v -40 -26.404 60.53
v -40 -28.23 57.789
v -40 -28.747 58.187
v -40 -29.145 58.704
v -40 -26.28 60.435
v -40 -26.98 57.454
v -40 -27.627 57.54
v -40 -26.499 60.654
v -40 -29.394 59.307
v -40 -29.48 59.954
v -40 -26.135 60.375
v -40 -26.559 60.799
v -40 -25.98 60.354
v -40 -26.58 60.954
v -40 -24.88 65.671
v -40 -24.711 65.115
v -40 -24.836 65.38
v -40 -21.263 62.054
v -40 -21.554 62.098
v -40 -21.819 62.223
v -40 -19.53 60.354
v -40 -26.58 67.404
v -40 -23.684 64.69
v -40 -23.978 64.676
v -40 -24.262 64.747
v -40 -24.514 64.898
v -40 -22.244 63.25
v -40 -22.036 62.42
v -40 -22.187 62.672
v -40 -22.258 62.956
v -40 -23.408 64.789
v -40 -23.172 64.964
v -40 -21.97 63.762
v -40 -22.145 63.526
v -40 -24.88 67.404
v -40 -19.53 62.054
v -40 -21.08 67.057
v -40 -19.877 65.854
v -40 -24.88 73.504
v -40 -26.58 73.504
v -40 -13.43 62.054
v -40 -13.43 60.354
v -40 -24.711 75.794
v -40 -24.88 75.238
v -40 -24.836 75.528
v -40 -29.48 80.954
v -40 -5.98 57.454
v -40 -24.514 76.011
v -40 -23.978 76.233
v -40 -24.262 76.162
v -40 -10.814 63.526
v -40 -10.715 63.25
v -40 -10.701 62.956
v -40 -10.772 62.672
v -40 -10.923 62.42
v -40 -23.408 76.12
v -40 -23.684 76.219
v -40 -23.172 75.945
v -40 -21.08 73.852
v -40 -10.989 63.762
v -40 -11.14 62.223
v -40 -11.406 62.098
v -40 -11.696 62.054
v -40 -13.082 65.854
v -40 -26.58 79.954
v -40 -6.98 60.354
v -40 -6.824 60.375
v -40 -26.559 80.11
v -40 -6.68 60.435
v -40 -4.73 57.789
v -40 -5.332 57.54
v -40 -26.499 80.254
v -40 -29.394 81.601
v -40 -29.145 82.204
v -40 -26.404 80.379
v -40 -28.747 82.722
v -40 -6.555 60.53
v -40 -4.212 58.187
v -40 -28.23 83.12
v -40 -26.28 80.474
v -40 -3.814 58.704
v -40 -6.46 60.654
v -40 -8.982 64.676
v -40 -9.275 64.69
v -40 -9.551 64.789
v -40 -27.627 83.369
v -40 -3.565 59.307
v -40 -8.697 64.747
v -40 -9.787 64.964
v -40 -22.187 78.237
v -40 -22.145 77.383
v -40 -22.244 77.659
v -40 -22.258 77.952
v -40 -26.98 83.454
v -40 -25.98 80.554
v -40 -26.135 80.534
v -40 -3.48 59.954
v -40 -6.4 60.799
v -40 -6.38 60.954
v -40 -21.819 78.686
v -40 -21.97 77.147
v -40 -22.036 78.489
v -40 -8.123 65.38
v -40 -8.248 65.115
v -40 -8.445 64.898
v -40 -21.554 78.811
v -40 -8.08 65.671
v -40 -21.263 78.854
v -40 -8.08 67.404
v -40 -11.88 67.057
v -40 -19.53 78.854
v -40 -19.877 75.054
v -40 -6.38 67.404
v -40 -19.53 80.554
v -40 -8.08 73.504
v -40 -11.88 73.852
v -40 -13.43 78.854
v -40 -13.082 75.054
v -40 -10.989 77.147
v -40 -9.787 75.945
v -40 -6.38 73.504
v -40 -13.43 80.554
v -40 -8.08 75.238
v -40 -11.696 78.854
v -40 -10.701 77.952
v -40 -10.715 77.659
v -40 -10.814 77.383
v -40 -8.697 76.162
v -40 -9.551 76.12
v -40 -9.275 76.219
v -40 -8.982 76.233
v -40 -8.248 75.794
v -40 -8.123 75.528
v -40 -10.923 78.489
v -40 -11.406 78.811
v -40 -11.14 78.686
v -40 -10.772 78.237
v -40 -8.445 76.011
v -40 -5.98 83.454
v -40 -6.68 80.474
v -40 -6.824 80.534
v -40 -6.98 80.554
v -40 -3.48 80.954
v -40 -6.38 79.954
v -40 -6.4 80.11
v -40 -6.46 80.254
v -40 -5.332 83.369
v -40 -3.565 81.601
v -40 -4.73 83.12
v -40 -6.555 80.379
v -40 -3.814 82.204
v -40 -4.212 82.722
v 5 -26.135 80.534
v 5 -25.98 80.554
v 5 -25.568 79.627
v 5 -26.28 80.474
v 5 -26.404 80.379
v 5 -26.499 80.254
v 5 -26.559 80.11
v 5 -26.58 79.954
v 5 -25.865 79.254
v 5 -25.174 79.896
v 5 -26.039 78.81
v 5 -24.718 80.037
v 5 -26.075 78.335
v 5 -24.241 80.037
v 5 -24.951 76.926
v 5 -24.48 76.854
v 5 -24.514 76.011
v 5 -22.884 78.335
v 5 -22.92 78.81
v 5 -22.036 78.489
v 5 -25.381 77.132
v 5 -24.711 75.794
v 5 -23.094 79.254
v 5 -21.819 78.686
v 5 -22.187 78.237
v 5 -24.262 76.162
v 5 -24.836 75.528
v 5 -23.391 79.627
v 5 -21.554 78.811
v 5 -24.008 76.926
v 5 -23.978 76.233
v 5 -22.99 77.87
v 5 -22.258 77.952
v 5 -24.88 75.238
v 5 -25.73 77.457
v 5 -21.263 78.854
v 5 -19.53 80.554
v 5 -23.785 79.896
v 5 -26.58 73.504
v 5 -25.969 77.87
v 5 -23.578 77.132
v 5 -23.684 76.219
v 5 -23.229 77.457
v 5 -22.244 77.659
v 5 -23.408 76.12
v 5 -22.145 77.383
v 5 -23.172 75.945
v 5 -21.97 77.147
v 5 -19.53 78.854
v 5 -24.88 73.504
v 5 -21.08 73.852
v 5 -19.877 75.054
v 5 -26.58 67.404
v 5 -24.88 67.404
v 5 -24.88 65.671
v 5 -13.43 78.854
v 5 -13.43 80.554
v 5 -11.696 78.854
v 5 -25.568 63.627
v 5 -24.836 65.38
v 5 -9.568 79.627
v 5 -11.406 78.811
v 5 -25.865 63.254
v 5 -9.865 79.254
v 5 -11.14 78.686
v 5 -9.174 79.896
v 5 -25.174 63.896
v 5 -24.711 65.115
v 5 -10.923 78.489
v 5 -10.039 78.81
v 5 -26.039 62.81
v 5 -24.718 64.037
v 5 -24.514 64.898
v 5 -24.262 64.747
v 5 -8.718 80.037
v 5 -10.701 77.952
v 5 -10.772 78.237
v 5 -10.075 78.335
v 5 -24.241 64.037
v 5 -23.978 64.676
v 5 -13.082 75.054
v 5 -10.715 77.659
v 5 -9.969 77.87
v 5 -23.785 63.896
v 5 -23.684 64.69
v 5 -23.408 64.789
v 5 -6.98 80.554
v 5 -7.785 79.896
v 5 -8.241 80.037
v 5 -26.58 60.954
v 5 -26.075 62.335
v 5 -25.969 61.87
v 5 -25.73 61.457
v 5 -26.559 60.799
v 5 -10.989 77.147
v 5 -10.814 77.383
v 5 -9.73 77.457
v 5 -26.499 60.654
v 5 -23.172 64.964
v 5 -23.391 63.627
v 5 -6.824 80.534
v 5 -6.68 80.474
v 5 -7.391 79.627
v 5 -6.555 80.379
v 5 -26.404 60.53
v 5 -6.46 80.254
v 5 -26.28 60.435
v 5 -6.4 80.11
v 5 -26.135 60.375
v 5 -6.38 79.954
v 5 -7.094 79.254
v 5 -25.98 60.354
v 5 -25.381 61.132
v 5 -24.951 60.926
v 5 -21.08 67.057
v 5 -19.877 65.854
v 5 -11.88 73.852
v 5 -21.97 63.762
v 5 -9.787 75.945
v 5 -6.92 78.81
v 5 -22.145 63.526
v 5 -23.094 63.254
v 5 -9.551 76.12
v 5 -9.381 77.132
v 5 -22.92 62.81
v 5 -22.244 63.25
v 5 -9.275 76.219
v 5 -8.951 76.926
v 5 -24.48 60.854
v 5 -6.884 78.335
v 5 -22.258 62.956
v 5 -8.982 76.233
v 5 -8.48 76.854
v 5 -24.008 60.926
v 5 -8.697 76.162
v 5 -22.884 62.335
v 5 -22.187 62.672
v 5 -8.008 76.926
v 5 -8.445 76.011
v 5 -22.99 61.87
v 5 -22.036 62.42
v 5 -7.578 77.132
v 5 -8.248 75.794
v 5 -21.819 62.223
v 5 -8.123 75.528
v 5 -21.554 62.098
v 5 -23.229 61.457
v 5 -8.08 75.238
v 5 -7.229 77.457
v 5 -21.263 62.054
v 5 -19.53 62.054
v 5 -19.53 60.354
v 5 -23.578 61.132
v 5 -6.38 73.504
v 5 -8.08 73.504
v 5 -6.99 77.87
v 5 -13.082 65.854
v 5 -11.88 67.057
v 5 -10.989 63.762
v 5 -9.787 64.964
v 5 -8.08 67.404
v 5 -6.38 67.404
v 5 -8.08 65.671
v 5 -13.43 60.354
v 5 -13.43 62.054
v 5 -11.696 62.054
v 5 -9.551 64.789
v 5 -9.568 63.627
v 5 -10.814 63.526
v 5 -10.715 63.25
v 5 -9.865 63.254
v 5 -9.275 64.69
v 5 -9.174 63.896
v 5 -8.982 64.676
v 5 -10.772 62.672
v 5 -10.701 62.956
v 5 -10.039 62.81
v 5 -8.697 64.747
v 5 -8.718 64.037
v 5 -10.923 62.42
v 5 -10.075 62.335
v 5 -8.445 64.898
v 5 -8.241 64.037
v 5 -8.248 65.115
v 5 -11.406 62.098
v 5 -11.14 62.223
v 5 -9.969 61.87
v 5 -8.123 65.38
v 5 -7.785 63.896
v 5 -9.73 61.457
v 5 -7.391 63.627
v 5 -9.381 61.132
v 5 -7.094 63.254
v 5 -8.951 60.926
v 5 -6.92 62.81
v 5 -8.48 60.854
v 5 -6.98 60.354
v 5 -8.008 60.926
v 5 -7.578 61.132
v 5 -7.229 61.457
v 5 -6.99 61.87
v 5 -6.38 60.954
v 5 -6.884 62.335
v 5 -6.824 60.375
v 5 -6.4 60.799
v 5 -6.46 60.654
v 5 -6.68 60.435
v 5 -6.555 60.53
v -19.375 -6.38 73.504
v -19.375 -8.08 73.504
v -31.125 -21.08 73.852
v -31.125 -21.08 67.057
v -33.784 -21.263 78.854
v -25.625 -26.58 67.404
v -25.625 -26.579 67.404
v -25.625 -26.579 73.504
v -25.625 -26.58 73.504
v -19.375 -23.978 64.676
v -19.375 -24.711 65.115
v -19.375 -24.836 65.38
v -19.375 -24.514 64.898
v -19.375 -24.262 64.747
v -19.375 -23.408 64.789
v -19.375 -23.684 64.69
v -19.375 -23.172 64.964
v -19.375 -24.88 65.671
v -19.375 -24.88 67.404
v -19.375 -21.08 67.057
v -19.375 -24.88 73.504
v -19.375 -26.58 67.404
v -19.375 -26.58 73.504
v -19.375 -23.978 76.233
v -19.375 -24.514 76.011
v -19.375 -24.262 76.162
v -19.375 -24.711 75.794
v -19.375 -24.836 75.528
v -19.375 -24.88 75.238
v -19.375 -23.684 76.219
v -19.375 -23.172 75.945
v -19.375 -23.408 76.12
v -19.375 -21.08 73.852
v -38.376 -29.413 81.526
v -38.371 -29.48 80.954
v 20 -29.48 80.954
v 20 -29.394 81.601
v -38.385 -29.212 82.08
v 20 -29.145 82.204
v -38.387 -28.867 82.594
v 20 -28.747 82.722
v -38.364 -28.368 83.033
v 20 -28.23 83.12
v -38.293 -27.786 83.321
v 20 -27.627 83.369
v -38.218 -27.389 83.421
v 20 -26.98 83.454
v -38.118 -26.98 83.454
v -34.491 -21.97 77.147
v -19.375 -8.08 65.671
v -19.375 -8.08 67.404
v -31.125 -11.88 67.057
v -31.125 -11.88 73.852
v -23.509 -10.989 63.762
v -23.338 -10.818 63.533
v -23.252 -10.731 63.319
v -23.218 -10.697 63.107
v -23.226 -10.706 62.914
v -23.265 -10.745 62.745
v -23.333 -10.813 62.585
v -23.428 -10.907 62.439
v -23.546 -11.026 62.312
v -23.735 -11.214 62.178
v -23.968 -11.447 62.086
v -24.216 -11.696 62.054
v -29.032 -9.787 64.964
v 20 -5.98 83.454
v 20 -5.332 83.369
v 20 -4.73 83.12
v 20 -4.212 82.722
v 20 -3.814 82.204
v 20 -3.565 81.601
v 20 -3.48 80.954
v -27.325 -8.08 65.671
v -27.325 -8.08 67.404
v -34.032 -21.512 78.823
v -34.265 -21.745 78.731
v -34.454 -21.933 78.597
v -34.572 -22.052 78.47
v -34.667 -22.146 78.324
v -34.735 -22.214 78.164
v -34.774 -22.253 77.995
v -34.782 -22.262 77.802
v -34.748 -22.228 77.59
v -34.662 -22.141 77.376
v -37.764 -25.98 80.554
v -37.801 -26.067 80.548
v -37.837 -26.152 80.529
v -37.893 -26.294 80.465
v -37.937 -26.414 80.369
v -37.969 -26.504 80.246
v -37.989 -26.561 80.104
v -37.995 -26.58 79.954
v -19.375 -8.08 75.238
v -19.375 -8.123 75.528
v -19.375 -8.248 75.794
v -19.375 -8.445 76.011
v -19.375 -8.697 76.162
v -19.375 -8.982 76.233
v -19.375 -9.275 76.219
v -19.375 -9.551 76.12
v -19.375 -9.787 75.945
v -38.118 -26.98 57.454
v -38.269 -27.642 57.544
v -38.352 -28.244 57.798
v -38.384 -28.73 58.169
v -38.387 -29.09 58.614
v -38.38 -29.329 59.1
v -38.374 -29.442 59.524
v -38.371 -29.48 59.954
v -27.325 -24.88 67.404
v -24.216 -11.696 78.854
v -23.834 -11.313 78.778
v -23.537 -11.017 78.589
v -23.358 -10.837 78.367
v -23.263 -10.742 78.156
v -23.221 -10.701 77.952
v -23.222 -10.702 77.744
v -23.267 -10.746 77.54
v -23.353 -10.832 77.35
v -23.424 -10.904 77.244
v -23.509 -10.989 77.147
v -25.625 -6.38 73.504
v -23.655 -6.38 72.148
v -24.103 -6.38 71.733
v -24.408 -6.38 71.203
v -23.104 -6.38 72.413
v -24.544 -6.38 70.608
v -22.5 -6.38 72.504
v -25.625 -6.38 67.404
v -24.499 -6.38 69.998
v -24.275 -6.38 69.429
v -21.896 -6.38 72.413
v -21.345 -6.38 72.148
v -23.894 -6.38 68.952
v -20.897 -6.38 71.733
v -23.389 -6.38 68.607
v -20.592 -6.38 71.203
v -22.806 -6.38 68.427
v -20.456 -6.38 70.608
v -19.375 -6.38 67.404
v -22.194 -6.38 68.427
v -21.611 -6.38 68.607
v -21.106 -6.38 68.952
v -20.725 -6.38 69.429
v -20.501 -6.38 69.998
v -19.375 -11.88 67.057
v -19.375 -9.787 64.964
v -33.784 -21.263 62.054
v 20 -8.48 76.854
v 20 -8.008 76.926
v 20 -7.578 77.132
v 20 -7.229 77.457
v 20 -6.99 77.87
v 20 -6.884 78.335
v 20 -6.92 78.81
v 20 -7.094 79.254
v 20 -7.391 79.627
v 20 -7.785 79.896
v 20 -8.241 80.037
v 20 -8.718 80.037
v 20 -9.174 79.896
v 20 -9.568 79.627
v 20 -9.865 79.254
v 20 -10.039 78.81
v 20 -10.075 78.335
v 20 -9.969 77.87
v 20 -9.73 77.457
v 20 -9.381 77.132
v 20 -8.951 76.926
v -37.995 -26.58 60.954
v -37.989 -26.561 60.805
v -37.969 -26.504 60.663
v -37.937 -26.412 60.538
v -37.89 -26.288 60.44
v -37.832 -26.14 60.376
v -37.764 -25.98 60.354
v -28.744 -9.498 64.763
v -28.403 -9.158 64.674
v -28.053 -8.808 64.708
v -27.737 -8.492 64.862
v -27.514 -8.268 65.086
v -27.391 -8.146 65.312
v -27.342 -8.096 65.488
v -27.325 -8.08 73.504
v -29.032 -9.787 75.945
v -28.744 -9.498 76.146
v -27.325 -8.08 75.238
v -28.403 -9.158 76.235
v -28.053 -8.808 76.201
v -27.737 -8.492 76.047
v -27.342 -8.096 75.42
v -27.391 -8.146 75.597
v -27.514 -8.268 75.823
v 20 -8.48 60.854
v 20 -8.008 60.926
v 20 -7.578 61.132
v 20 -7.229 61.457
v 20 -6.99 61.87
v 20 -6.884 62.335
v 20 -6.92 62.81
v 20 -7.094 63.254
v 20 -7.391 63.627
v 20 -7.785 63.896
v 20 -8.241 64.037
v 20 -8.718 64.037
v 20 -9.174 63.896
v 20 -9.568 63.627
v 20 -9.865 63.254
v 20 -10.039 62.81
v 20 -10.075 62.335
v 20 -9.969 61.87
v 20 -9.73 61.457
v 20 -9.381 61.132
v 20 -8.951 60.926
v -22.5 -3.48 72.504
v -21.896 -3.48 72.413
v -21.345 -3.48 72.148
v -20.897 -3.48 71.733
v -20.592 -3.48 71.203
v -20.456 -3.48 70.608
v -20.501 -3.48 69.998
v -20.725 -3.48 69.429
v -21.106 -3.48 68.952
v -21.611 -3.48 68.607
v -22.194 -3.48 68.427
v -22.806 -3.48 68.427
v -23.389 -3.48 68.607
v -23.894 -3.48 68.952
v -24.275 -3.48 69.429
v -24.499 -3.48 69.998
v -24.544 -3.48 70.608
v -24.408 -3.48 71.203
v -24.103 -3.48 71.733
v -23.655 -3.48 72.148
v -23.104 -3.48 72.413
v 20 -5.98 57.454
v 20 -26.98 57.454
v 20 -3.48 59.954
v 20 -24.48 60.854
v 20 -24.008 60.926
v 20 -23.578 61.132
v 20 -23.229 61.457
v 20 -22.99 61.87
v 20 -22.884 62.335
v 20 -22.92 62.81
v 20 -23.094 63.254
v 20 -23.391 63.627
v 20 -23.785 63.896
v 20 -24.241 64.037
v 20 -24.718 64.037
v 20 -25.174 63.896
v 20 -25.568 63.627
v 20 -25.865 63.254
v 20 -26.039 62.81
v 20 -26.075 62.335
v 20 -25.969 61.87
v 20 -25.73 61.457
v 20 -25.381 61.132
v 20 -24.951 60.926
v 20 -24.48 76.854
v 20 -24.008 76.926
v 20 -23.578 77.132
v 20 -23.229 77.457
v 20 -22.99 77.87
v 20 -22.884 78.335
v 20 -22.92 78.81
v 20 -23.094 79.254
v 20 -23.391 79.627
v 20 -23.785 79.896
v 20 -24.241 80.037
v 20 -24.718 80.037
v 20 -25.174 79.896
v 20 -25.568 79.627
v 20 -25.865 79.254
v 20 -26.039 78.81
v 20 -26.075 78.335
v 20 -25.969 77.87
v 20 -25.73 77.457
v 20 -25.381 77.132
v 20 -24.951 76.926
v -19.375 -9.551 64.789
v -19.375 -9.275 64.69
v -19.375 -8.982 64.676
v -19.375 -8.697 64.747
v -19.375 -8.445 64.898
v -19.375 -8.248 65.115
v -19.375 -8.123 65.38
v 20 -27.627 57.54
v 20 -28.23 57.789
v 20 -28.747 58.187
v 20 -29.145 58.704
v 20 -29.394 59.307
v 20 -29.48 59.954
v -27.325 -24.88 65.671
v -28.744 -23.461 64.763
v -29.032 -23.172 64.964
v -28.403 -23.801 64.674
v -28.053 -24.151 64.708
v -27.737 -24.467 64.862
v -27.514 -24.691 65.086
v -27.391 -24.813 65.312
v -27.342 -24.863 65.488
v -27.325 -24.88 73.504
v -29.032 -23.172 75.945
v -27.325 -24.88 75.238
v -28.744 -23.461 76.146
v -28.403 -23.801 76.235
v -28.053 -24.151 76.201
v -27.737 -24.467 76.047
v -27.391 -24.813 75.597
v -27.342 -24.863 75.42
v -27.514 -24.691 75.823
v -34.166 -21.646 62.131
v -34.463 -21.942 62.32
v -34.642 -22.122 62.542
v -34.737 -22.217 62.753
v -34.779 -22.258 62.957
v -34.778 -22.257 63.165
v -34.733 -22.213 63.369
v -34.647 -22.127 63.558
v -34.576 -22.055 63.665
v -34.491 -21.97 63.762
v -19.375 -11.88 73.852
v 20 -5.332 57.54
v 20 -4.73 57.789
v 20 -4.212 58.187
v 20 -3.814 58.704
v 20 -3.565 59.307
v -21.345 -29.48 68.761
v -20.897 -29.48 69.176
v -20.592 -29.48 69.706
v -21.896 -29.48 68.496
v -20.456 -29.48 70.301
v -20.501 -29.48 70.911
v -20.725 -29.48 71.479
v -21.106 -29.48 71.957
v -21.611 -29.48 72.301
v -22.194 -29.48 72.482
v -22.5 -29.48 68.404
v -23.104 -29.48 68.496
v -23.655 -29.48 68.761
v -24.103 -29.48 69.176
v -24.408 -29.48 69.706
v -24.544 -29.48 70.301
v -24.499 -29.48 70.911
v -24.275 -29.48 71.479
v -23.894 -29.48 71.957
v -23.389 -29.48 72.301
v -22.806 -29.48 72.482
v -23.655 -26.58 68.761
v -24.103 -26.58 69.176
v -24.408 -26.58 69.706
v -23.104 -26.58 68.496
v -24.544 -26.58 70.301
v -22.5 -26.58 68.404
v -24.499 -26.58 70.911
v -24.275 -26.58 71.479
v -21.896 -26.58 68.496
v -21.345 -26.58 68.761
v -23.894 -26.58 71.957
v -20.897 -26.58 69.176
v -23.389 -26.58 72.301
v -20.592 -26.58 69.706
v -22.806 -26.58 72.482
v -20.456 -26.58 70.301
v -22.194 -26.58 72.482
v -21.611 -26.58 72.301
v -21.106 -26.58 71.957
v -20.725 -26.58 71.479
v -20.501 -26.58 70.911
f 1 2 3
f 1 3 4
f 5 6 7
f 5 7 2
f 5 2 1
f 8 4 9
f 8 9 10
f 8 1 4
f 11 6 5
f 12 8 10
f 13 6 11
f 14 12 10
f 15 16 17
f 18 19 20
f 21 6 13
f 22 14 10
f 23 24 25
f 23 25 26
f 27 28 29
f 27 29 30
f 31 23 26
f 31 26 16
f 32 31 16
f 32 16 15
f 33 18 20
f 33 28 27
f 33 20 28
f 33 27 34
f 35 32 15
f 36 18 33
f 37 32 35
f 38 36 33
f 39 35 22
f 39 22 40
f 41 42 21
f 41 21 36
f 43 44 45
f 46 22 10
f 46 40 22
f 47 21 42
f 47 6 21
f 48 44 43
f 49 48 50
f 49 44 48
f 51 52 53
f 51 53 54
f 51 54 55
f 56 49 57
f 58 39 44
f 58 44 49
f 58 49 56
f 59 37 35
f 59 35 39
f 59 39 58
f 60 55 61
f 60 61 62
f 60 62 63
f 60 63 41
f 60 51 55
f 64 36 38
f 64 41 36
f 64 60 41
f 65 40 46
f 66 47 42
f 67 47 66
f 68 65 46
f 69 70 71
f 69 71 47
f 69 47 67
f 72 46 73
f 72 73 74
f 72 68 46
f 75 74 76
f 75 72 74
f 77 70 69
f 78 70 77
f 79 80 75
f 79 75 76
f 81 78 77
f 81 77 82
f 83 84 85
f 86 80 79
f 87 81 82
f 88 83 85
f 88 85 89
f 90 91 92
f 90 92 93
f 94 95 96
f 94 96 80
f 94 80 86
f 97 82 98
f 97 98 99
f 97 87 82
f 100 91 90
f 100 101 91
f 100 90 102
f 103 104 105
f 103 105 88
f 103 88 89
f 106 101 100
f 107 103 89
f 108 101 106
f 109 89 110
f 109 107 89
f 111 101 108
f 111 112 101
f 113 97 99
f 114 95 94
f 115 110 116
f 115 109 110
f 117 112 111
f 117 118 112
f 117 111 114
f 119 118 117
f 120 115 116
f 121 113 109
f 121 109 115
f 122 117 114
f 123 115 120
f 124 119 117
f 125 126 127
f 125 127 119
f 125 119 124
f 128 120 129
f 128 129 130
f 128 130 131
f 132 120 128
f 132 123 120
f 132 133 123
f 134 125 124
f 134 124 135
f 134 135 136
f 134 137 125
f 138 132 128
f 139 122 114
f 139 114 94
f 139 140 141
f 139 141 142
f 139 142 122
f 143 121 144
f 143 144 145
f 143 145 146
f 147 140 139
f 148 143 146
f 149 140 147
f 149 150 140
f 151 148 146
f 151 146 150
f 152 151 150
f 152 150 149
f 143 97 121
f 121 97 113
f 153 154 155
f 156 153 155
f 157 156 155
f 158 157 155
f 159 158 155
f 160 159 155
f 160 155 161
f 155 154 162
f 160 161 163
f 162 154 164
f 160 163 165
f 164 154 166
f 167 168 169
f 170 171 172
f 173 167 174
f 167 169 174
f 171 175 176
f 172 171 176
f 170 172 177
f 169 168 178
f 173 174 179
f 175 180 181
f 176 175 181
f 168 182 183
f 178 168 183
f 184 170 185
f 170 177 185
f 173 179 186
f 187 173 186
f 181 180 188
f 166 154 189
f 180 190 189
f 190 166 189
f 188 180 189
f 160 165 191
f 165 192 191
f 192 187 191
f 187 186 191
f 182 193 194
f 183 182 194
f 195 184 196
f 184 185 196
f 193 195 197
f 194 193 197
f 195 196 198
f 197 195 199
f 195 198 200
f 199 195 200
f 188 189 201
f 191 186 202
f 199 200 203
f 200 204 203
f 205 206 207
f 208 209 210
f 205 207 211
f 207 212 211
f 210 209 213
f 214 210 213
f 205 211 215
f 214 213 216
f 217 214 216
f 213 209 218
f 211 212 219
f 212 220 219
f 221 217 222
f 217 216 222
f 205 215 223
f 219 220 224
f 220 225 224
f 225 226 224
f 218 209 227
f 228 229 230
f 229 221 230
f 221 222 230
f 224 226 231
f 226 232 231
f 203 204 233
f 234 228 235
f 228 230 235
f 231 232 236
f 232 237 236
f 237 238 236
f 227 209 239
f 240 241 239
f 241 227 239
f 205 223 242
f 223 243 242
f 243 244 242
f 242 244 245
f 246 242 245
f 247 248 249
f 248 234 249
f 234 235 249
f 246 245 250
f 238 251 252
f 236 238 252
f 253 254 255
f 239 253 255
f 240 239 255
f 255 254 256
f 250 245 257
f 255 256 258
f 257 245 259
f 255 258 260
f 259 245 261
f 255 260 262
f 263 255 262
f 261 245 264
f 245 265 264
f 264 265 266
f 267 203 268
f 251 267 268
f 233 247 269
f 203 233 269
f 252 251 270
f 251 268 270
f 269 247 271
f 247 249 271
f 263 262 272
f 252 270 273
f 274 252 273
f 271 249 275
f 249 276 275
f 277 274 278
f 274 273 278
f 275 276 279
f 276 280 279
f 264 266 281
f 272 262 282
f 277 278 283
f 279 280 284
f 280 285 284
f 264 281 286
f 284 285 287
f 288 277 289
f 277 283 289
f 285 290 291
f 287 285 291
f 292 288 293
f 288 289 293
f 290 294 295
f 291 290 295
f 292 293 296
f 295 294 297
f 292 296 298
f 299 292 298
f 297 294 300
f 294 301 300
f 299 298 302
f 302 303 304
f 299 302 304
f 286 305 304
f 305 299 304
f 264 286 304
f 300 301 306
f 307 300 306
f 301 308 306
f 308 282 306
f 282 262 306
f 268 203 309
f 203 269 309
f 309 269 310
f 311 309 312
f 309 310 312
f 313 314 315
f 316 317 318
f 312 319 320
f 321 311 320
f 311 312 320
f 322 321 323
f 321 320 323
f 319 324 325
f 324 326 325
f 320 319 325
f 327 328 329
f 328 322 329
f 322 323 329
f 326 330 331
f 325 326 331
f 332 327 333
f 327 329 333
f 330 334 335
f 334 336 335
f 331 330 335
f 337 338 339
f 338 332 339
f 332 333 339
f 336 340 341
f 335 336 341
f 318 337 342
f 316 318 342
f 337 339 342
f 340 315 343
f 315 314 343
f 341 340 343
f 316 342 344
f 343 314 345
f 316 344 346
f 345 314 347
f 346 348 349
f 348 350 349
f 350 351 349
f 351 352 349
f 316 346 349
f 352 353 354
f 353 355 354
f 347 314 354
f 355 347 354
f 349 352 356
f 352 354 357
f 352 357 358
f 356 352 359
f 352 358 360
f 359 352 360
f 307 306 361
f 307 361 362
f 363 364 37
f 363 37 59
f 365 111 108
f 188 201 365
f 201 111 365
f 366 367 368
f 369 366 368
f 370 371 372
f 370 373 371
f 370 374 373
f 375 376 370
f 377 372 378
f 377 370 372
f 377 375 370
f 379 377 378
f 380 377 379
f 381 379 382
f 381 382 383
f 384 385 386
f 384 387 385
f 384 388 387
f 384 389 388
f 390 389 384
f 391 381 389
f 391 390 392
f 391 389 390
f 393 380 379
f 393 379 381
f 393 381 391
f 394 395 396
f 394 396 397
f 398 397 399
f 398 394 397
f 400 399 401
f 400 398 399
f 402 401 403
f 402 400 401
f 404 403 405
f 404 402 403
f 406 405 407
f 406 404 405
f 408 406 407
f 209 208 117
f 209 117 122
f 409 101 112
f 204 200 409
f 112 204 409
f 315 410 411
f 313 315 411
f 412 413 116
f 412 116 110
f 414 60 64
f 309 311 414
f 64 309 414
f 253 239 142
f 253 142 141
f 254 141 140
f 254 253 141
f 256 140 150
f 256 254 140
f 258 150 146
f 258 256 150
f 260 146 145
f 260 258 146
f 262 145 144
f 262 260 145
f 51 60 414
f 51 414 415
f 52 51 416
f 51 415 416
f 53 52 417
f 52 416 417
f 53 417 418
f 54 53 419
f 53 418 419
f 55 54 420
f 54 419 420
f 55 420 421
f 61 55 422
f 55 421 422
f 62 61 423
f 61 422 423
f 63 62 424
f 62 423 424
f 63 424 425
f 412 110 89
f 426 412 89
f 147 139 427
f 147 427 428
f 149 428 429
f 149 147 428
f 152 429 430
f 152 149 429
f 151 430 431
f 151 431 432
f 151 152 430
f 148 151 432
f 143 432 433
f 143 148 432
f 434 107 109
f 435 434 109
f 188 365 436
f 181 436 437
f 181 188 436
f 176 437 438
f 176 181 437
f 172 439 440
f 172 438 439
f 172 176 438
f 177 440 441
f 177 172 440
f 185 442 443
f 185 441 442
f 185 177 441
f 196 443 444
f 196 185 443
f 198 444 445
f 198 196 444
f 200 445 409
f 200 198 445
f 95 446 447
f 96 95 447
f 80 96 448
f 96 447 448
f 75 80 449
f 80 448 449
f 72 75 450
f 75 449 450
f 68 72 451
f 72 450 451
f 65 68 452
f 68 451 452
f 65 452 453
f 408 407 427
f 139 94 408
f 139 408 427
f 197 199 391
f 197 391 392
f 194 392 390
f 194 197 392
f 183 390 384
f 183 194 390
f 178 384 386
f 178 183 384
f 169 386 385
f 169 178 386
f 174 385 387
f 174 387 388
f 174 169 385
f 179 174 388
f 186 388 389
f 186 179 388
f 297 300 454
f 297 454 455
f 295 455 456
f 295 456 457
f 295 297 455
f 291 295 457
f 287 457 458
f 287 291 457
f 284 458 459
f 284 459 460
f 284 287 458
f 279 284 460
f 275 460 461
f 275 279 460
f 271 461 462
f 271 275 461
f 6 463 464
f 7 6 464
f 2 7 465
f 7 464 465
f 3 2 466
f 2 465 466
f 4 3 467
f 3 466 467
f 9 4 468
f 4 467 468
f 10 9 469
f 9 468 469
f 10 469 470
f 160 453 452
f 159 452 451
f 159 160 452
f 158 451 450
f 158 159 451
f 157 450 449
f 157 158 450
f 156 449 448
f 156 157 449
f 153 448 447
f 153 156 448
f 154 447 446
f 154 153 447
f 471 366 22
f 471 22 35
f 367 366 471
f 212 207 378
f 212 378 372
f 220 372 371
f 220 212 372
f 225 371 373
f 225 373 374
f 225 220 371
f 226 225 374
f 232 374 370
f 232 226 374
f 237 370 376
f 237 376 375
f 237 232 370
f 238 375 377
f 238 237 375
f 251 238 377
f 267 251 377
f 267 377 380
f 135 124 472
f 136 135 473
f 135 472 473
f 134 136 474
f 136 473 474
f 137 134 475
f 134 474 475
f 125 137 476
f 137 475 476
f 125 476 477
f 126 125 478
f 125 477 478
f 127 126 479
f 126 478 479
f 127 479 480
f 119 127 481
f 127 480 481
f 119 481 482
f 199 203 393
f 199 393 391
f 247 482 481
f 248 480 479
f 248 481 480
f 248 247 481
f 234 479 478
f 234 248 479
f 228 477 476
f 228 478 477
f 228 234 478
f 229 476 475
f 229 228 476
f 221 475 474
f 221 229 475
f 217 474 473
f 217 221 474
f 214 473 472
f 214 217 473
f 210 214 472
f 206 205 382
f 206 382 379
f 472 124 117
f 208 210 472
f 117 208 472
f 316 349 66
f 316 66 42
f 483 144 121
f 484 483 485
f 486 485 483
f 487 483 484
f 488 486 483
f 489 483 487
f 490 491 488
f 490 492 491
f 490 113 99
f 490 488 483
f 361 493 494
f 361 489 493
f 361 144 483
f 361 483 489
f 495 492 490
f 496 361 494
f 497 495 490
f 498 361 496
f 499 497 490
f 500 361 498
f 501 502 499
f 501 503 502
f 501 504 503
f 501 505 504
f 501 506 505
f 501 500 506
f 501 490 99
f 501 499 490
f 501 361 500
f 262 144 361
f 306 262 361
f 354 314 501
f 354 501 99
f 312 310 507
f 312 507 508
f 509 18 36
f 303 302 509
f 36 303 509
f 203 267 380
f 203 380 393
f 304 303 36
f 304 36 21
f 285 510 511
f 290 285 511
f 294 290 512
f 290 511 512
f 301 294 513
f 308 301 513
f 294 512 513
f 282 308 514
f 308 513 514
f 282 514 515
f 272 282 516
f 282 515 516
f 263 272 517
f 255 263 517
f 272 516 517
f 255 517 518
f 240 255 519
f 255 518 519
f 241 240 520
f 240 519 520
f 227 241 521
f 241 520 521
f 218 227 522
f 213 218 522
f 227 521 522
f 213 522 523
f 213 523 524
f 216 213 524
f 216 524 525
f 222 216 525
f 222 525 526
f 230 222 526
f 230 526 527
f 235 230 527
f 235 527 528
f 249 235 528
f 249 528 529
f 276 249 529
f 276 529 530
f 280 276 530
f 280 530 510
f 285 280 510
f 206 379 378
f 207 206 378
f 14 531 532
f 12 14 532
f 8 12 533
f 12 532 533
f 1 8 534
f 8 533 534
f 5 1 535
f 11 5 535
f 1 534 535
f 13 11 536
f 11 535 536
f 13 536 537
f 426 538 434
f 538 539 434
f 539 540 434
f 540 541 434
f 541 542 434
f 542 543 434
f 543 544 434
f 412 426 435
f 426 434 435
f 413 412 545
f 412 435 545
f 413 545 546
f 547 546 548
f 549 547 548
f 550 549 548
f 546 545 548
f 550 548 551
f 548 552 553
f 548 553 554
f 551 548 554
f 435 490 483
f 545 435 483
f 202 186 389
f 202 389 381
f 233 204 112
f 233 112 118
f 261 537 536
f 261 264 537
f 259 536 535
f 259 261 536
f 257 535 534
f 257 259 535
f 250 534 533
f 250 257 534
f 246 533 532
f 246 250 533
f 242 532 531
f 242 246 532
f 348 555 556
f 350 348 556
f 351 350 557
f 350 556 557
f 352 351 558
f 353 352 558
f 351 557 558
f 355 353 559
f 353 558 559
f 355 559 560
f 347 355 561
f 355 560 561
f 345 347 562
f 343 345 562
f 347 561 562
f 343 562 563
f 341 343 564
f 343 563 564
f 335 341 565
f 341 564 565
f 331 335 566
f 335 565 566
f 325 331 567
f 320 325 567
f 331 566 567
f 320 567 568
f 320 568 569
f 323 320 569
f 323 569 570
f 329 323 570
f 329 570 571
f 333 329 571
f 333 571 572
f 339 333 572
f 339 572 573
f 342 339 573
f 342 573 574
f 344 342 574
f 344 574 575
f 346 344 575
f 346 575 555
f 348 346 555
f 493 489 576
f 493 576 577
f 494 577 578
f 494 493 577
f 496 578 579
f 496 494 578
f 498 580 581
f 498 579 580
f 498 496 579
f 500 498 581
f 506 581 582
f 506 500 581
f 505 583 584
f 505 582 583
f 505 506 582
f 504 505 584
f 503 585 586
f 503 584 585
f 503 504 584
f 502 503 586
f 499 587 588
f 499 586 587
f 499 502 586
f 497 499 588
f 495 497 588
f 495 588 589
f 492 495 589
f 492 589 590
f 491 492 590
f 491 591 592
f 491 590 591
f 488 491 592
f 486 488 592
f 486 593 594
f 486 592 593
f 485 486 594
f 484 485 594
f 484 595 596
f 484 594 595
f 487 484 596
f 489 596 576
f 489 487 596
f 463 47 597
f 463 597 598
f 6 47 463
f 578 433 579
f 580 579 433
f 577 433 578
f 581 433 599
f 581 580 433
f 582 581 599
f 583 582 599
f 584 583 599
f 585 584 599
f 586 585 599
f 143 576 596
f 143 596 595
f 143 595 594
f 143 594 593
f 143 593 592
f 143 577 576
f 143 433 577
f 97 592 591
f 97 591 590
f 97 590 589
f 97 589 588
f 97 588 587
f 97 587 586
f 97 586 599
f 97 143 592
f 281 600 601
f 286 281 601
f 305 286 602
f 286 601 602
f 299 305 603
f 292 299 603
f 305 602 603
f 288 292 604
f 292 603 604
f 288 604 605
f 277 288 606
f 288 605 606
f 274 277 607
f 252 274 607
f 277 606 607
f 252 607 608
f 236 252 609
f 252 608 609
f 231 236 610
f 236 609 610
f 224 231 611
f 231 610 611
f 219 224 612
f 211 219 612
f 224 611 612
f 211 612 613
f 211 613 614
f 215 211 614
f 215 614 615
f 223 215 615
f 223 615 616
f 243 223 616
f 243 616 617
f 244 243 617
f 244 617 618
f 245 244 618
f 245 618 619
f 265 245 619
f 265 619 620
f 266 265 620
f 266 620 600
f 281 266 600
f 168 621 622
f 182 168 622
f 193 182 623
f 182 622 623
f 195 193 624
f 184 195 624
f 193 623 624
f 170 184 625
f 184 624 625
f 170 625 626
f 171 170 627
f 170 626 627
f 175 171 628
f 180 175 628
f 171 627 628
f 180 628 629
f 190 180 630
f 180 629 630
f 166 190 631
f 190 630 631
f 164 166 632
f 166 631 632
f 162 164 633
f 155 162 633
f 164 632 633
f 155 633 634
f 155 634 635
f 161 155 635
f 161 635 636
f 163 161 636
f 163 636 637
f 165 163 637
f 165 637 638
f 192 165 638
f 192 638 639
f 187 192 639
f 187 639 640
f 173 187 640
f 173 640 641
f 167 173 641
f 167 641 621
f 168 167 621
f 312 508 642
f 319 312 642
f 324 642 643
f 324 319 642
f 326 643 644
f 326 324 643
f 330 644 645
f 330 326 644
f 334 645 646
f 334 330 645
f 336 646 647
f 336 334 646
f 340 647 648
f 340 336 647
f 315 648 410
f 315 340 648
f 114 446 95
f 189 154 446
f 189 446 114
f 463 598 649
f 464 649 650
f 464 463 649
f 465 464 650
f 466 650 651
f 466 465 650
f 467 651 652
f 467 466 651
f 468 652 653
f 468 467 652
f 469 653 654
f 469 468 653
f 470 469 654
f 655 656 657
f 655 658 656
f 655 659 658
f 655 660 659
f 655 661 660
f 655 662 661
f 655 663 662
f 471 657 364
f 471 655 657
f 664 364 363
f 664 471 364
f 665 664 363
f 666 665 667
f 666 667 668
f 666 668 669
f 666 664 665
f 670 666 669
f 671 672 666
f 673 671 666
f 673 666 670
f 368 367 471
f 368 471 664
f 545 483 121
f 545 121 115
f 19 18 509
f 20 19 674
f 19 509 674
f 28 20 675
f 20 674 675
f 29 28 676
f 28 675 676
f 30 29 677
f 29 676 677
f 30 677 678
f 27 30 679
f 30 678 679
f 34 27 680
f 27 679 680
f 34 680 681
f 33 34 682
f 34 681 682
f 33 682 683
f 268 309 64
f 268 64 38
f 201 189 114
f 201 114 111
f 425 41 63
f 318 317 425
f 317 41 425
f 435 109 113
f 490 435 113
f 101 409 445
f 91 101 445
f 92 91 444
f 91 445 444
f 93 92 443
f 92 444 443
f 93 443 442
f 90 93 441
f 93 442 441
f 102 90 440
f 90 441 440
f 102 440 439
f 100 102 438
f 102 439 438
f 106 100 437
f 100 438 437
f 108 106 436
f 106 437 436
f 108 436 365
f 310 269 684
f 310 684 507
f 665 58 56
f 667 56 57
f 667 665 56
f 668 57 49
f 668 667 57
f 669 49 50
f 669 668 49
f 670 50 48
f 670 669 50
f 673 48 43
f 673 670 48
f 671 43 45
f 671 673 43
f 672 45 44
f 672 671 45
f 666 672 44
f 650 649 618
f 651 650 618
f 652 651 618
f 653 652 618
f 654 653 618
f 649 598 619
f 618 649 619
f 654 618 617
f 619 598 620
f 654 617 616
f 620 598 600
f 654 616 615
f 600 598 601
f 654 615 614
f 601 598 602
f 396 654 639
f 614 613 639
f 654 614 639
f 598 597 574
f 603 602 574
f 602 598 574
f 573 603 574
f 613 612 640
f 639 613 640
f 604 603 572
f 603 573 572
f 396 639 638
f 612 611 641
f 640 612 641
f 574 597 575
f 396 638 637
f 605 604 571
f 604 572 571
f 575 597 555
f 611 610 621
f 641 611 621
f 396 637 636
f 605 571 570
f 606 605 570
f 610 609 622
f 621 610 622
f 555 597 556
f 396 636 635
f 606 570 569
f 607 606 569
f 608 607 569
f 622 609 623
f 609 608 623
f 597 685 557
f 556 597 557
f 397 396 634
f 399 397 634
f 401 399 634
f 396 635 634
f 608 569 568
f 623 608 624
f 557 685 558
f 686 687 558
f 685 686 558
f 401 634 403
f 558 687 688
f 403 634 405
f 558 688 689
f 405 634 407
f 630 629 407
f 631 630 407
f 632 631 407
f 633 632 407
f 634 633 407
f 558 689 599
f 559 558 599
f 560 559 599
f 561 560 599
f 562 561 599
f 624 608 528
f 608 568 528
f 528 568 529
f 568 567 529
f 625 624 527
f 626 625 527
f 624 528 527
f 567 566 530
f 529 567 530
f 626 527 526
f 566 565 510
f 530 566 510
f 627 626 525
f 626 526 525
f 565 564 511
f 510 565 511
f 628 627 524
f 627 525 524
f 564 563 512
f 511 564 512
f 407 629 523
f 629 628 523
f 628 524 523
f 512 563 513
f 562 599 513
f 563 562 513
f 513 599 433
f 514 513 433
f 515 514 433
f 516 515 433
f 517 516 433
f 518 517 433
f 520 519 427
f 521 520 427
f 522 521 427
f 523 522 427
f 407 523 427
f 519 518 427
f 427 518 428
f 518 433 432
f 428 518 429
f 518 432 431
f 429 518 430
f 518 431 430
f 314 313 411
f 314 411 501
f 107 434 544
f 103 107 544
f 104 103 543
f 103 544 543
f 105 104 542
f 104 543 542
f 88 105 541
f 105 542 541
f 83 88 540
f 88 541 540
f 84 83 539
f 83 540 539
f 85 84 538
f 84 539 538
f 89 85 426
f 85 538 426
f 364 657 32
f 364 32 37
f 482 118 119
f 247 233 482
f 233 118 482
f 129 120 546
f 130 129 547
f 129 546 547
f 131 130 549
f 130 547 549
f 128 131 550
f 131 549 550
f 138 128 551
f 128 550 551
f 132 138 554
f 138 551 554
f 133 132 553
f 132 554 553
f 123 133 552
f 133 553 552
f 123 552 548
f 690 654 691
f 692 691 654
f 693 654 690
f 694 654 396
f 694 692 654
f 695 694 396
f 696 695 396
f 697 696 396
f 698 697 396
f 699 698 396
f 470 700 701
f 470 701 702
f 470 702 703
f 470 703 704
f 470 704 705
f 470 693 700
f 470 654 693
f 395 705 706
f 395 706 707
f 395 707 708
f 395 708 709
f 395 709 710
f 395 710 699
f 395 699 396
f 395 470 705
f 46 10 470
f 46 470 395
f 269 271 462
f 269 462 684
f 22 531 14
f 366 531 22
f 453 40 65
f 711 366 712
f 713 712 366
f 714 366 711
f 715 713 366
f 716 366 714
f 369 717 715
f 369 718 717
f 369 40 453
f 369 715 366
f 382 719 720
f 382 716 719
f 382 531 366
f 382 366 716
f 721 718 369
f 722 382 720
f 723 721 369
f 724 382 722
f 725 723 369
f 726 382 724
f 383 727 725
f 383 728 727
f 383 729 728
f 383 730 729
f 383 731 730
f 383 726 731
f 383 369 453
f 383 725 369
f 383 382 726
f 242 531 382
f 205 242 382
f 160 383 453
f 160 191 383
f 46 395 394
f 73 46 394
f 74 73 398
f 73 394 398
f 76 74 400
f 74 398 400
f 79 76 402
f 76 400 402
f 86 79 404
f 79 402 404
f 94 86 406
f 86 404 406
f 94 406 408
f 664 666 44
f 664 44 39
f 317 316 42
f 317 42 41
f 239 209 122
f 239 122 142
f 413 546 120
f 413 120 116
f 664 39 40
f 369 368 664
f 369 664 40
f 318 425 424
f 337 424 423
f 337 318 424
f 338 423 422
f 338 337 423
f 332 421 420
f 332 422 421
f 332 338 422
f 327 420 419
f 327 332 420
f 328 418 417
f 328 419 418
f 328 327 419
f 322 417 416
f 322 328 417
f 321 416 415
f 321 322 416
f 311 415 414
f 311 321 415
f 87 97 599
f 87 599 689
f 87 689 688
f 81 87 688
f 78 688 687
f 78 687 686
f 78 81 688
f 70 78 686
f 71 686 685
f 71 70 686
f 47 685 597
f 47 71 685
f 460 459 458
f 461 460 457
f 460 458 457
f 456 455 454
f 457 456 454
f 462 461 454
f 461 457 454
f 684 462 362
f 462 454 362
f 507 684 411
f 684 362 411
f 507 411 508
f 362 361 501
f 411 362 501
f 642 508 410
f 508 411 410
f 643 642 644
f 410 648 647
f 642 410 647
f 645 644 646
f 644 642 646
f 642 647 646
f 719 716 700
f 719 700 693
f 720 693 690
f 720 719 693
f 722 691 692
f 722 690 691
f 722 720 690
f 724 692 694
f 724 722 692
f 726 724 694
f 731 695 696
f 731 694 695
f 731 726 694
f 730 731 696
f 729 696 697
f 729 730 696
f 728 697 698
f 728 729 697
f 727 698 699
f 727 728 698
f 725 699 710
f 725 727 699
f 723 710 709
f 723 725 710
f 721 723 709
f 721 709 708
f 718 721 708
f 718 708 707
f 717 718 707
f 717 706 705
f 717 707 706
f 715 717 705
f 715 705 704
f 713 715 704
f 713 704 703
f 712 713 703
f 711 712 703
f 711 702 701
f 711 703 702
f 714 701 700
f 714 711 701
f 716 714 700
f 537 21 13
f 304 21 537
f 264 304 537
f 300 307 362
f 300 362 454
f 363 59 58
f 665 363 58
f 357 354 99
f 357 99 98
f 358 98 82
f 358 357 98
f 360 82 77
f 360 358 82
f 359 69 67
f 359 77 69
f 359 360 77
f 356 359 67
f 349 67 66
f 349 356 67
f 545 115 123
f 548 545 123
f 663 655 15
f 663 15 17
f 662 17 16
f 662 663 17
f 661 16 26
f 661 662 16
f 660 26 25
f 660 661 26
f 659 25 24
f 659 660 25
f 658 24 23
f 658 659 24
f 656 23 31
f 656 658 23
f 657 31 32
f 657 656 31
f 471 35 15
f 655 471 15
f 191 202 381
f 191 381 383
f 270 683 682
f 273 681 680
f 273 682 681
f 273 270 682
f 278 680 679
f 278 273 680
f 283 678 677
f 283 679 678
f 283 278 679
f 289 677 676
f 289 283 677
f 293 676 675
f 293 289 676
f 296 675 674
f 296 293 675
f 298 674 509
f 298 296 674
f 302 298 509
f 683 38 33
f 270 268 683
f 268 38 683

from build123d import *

# Parameters (mm, degrees)
BOSS_EXTRUDE1_DEPTH      = 39
BOSS_EXTRUDE1_DEPTH_BACK = 20
SKETCH1_W                = 42
SKETCH1_H                = 40
CUT_EXTRUDE3_DEPTH       = 68.939361812
CUT_EXTRUDE3_DEPTH_BACK  = 68.939361812
BOSS_EXTRUDE2_DEPTH      = 40
CUT_EXTRUDE7_START       = -10
SKETCH7_R                = 2.05
CUT_EXTRUDE7_DEPTH       = 116.132850877
CUT_EXTRUDE8_DEPTH       = 3.125
SKETCH9_R                = 2.778089848
BOSS_EXTRUDE3_DEPTH      = 6
CIRPATTERN1_COUNT        = 2
SKETCH10_W               = 6.985924482
SKETCH10_H               = 7.120269183
CUT_EXTRUDE13_DEPTH      = 8
SKETCH14_OUTSIDE_W       = 60.69
SKETCH14_OUTSIDE_H       = 58.69
CUT_EXTRUDE14_DEPTH      = 116.302529068
CHAMFER1_SIZE            = 5.5
SKETCH17_W               = 21.827069389
SKETCH17_H               = 22.909403407
BOSS_EXTRUDE4_DEPTH      = 15
SKETCH18_R               = 1.6
CUT_EXTRUDE15_DEPTH      = 107.928426814


with BuildPart() as part:
    # Sketch1 → Boss-Extrude1 (new, two sides: drawn at the far end of the back side and taken through both)
    with BuildSketch(Plane.ZY.offset(-BOSS_EXTRUDE1_DEPTH_BACK)):
        with Locations((70.454449321, -16.479540615)):
            Rectangle(SKETCH1_W, SKETCH1_H)
        with BuildLine():
            Line((77.147342539, -21.970352305), (75.054449321, -19.877459087))
            Line((75.054449321, -19.877459087), (75.054449321, -13.081622143))
            Line((75.054449321, -13.081622143), (77.147342539, -10.988728924))
            ThreePointArc((77.147342539, -10.988728924), (78.237132753, -10.771956173), (78.854449321, -11.695835705))
            Line((78.854449321, -11.695835705), (78.854449321, -13.429540615))
            Line((78.854449321, -13.429540615), (80.554449321, -13.429540615))
            Line((80.554449321, -13.429540615), (80.554449321, -6.979540615))
            ThreePointArc((80.554449321, -6.979540615), (80.378713389, -6.555276546), (79.954449321, -6.379540615))
            Line((79.954449321, -6.379540615), (73.504449321, -6.379540615))
            Line((73.504449321, -6.379540615), (73.504449321, -8.079540615))
            Line((73.504449321, -8.079540615), (75.23815423, -8.079540615))
            ThreePointArc((75.23815423, -8.079540615), (76.162033763, -8.696857182), (75.945261011, -9.786647396))
            Line((75.945261011, -9.786647396), (73.852367793, -11.879540615))
            Line((73.852367793, -11.879540615), (67.056530849, -11.879540615))
            Line((67.056530849, -11.879540615), (64.96363763, -9.786647396))
            ThreePointArc((64.96363763, -9.786647396), (64.746864878, -8.696857182), (65.670744411, -8.079540615))
            Line((65.670744411, -8.079540615), (67.404449321, -8.079540615))
            Line((67.404449321, -8.079540615), (67.404449321, -6.379540615))
            Line((67.404449321, -6.379540615), (60.954449321, -6.379540615))
            ThreePointArc((60.954449321, -6.379540615), (60.530185252, -6.555276546), (60.354449321, -6.979540615))
            Line((60.354449321, -6.979540615), (60.354449321, -13.429540615))
            Line((60.354449321, -13.429540615), (62.054449321, -13.429540615))
            Line((62.054449321, -13.429540615), (62.054449321, -11.695835705))
            ThreePointArc((62.054449321, -11.695835705), (62.671765888, -10.771956173), (63.761556102, -10.988728924))
            Line((63.761556102, -10.988728924), (65.854449321, -13.081622143))
            Line((65.854449321, -13.081622143), (65.854449321, -19.877459087))
            Line((65.854449321, -19.877459087), (63.761556102, -21.970352305))
            ThreePointArc((63.761556102, -21.970352305), (62.671765888, -22.187125057), (62.054449321, -21.263245524))
            Line((62.054449321, -21.263245524), (62.054449321, -19.529540615))
            Line((62.054449321, -19.529540615), (60.354449321, -19.529540615))
            Line((60.354449321, -19.529540615), (60.354449321, -25.979540615))
            ThreePointArc((60.354449321, -25.979540615), (60.530185252, -26.403804683), (60.954449321, -26.579540615))
            Line((60.954449321, -26.579540615), (67.404449321, -26.579540615))
            Line((67.404449321, -26.579540615), (67.404449321, -24.879540615))
            Line((67.404449321, -24.879540615), (65.670744411, -24.879540615))
            ThreePointArc((65.670744411, -24.879540615), (64.746864878, -24.262224047), (64.96363763, -23.172433833))
            Line((64.96363763, -23.172433833), (67.056530849, -21.079540615))
            Line((67.056530849, -21.079540615), (73.852367793, -21.079540615))
            Line((73.852367793, -21.079540615), (75.945261011, -23.172433833))
            ThreePointArc((75.945261011, -23.172433833), (76.162033763, -24.262224047), (75.23815423, -24.879540615))
            Line((75.23815423, -24.879540615), (73.504449321, -24.879540615))
            Line((73.504449321, -24.879540615), (73.504449321, -26.579540615))
            Line((73.504449321, -26.579540615), (79.954449321, -26.579540615))
            ThreePointArc((79.954449321, -26.579540615), (80.378713389, -26.403804683), (80.554449321, -25.979540615))
            Line((80.554449321, -25.979540615), (80.554449321, -19.529540615))
            Line((80.554449321, -19.529540615), (78.854449321, -19.529540615))
            Line((78.854449321, -19.529540615), (78.854449321, -21.263245524))
            ThreePointArc((78.854449321, -21.263245524), (78.237132753, -22.187125057), (77.147342539, -21.970352305))
        make_face(mode=Mode.SUBTRACT)
    extrude(amount=BOSS_EXTRUDE1_DEPTH + BOSS_EXTRUDE1_DEPTH_BACK)

    # Sketch2 → Cut-Extrude3 (cut, two sides: drawn at the far end of the back side and taken through both)
    with BuildSketch(Plane(origin=(0, 0, 91.454449321), x_dir=(-1, 0, 0), z_dir=(0, 0, -1)).offset(-CUT_EXTRUDE3_DEPTH_BACK)):
        with BuildLine():
            Line((9, 3.520459385), (39, 3.520459385))
            Line((39, 3.520459385), (39, -36.479540615))
            Line((39, -36.479540615), (30.968670474, -36.479540615))
            ThreePointArc((30.968670474, -36.479540615), (30.884335237, -36.480014542), (30.8, -36.479540615))
            Line((30.8, -36.479540615), (30.8, -37.552822487))
            Line((30.8, -37.552822487), (41.446354872, -37.552822487))
            Line((41.446354872, -37.552822487), (41.446354872, 6.899861608))
            Line((41.446354872, 6.899861608), (9, 6.899861608))
            Line((9, 6.899861608), (9, 3.520459385))
        make_face()
        with BuildLine():
            Line((39, -36.479540615), (39, 3.520459385))
            Line((39, 3.520459385), (9, 3.520459385))
            Line((9, 3.520459385), (36.19042941, -23.669970025))
            ThreePointArc((36.19042941, -23.669970025), (37.833109012, -31.808697916), (30.968670474, -36.479540615))
            Line((30.968670474, -36.479540615), (39, -36.479540615))
        make_face()
    extrude(amount=CUT_EXTRUDE3_DEPTH + CUT_EXTRUDE3_DEPTH_BACK, mode=Mode.SUBTRACT)

    # Sketch4 → Boss-Extrude2 (add)
    with BuildSketch(Plane(origin=(0, 0, 0), x_dir=(0, 0, -1), z_dir=(1, 0, 0))):
        with BuildLine():
            Line((-80.954449321, -3.479540615), (-59.954449321, -3.479540615))
            ThreePointArc((-59.954449321, -3.479540615), (-58.186682368, -4.211773662), (-57.454449321, -5.979540615))
            Line((-57.454449321, -5.979540615), (-57.454449321, -26.979540615))
            ThreePointArc((-57.454449321, -26.979540615), (-58.186682368, -28.747307568), (-59.954449321, -29.479540615))
            Line((-59.954449321, -29.479540615), (-80.954449321, -29.479540615))
            ThreePointArc((-80.954449321, -29.479540615), (-82.722216274, -28.747307568), (-83.454449321, -26.979540615))
            Line((-83.454449321, -26.979540615), (-83.454449321, -5.979540615))
            ThreePointArc((-83.454449321, -5.979540615), (-82.722216274, -4.211773662), (-80.954449321, -3.479540615))
        make_face()
        with BuildLine():
            Line((-62.054449321, -11.695835705), (-62.054449321, -13.429540615))
            Line((-62.054449321, -13.429540615), (-60.354449321, -13.429540615))
            Line((-60.354449321, -13.429540615), (-60.354449321, -6.979540615))
            ThreePointArc((-60.354449321, -6.979540615), (-60.530185252, -6.555276546), (-60.954449321, -6.379540615))
            Line((-60.954449321, -6.379540615), (-67.404449321, -6.379540615))
            Line((-67.404449321, -6.379540615), (-67.404449321, -8.079540615))
            Line((-67.404449321, -8.079540615), (-65.670744411, -8.079540615))
            ThreePointArc((-65.670744411, -8.079540615), (-64.746864878, -8.696857182), (-64.96363763, -9.786647396))
            Line((-64.96363763, -9.786647396), (-67.056530849, -11.879540615))
            Line((-67.056530849, -11.879540615), (-73.852367793, -11.879540615))
            Line((-73.852367793, -11.879540615), (-75.945261011, -9.786647396))
            ThreePointArc((-75.945261011, -9.786647396), (-76.162033763, -8.696857182), (-75.23815423, -8.079540615))
            Line((-75.23815423, -8.079540615), (-73.504449321, -8.079540615))
            Line((-73.504449321, -8.079540615), (-73.504449321, -6.379540615))
            Line((-73.504449321, -6.379540615), (-79.954449321, -6.379540615))
            ThreePointArc((-79.954449321, -6.379540615), (-80.378713389, -6.555276546), (-80.554449321, -6.979540615))
            Line((-80.554449321, -6.979540615), (-80.554449321, -13.429540615))
            Line((-80.554449321, -13.429540615), (-78.854449321, -13.429540615))
            Line((-78.854449321, -13.429540615), (-78.854449321, -11.695835705))
            ThreePointArc((-78.854449321, -11.695835705), (-78.237132753, -10.771956173), (-77.147342539, -10.988728924))
            Line((-77.147342539, -10.988728924), (-75.054449321, -13.081622143))
            Line((-75.054449321, -13.081622143), (-75.054449321, -19.877459087))
            Line((-75.054449321, -19.877459087), (-77.147342539, -21.970352305))
            ThreePointArc((-77.147342539, -21.970352305), (-78.237132753, -22.187125057), (-78.854449321, -21.263245524))
            Line((-78.854449321, -21.263245524), (-78.854449321, -19.529540615))
            Line((-78.854449321, -19.529540615), (-80.554449321, -19.529540615))
            Line((-80.554449321, -19.529540615), (-80.554449321, -25.979540615))
            ThreePointArc((-80.554449321, -25.979540615), (-80.378713389, -26.403804683), (-79.954449321, -26.579540615))
            Line((-79.954449321, -26.579540615), (-73.504449321, -26.579540615))
            Line((-73.504449321, -26.579540615), (-73.504449321, -24.879540615))
            Line((-73.504449321, -24.879540615), (-75.23815423, -24.879540615))
            ThreePointArc((-75.23815423, -24.879540615), (-76.162033763, -24.262224047), (-75.945261011, -23.172433833))
            Line((-75.945261011, -23.172433833), (-73.852367793, -21.079540615))
            Line((-73.852367793, -21.079540615), (-67.056530849, -21.079540615))
            Line((-67.056530849, -21.079540615), (-64.96363763, -23.172433833))
            ThreePointArc((-64.96363763, -23.172433833), (-64.746864878, -24.262224047), (-65.670744411, -24.879540615))
            Line((-65.670744411, -24.879540615), (-67.404449321, -24.879540615))
            Line((-67.404449321, -24.879540615), (-67.404449321, -26.579540615))
            Line((-67.404449321, -26.579540615), (-60.954449321, -26.579540615))
            ThreePointArc((-60.954449321, -26.579540615), (-60.530185252, -26.403804683), (-60.354449321, -25.979540615))
            Line((-60.354449321, -25.979540615), (-60.354449321, -19.529540615))
            Line((-60.354449321, -19.529540615), (-62.054449321, -19.529540615))
            Line((-62.054449321, -19.529540615), (-62.054449321, -21.263245524))
            ThreePointArc((-62.054449321, -21.263245524), (-62.671765888, -22.187125057), (-63.761556102, -21.970352305))
            Line((-63.761556102, -21.970352305), (-65.854449321, -19.877459087))
            Line((-65.854449321, -19.877459087), (-65.854449321, -13.081622143))
            Line((-65.854449321, -13.081622143), (-63.761556102, -10.988728924))
            ThreePointArc((-63.761556102, -10.988728924), (-62.671765888, -10.771956173), (-62.054449321, -11.695835705))
        make_face(mode=Mode.SUBTRACT)
    extrude(amount=-BOSS_EXTRUDE2_DEPTH)

    # Sketch7 → Cut-Extrude7 (cut)
    with BuildSketch(Plane(origin=(0, -3.479540615, 0), x_dir=(1, 0, 0), z_dir=(0, 1, 0)).offset(CUT_EXTRUDE7_START)):
        with Locations(Location((-22.5, -70.454449321, 0), (0, 0, 270))):
            Circle(SKETCH7_R)
    cut_extrude7 = extrude(amount=CUT_EXTRUDE7_DEPTH, mode=Mode.SUBTRACT)

    # Sketch8 → Cut-Extrude8 (cut, symmetric)
    with BuildSketch(Plane.ZY.offset(22.5)):
        Polygon((60.954449321, -6.379540615), (79.954449321, -6.379540615), (70.690797066, -16.49195704), align=None)
        Polygon((70.690797066, -16.49195704), (60.954449321, -26.579540615), (79.954449321, -26.579540615), align=None)
    extrude(amount=CUT_EXTRUDE8_DEPTH, both=True, mode=Mode.SUBTRACT)

    # CirPattern1: Cut-Extrude7 ×2 about axis
    cirpattern1_axis = Axis((-34, -16.479540615, 70.454449321), (-1, 0, 0))
    for i in range(1, CIRPATTERN1_COUNT):
        add(cut_extrude7.rotate(cirpattern1_axis, i * 360 / CIRPATTERN1_COUNT), mode=Mode.SUBTRACT)

    # Sketch14 outside → Cut-Extrude14 (cut, through all)
    with BuildSketch(Plane.ZY.offset(40)):
        with Locations((70.454, -16.48)):
            Rectangle(SKETCH14_OUTSIDE_W, SKETCH14_OUTSIDE_H)
        with BuildLine():
            Line((59.954449321, -29.479540615), (80.954449321, -29.479540615))
            ThreePointArc((80.954449321, -29.479540615), (82.722216274, -28.747307568), (83.454449321, -26.979540615))
            Line((83.454449321, -26.979540615), (83.454449321, -5.979540615))
            ThreePointArc((83.454449321, -5.979540615), (82.722216274, -4.211773662), (80.954449321, -3.479540615))
            Line((80.954449321, -3.479540615), (59.954449321, -3.479540615))
            ThreePointArc((59.954449321, -3.479540615), (58.186682368, -4.211773662), (57.454449321, -5.979540615))
            Line((57.454449321, -5.979540615), (57.454449321, -26.979540615))
            ThreePointArc((57.454449321, -26.979540615), (58.186682368, -28.747307568), (59.954449321, -29.479540615))
        make_face(mode=Mode.SUBTRACT)
    extrude(amount=-CUT_EXTRUDE14_DEPTH, mode=Mode.SUBTRACT)

    # Chamfer1
    chamfer1_edges = [part.edges().sort_by_distance(p)[0] for p in [
        (-25.625, -11.879540615, 70.454449321),
        (-25.625, -21.079540615, 70.454449321),
    ]]
    chamfer(chamfer1_edges, length=CHAMFER1_SIZE - 0.0001)  # a hair under: the kernel refuses the full size

    # Sketch17 → Boss-Extrude4 (add)
    with BuildSketch(Plane(origin=(20, 0, 0), x_dir=(0, 0, -1), z_dir=(1, 0, 0))):
        with Locations((-70.499546572, -16.637380993)):
            Rectangle(SKETCH17_W, SKETCH17_H)
    extrude(amount=-BOSS_EXTRUDE4_DEPTH)

    # Sketch18 → Cut-Extrude15 (cut, through all)
    with BuildSketch(Plane(origin=(20, 0, 0), x_dir=(0, 0, -1), z_dir=(1, 0, 0))):
        with Locations((-78.454449321, -8.479540615)):
            Circle(SKETCH18_R)
        with Locations((-62.454449321, -8.479540615)):
            Circle(SKETCH18_R)
        with Locations((-62.454449321, -24.479540615)):
            Circle(SKETCH18_R)
        with Locations((-78.454449321, -24.479540615)):
            Circle(SKETCH18_R)
    extrude(amount=-CUT_EXTRUDE15_DEPTH, mode=Mode.SUBTRACT)


with BuildPart() as body_2:
    # Sketch9 → Boss-Extrude3 (new body)
    with BuildSketch(Plane.ZY.offset(40)):
        with Locations((70.454449321, -16.479540615)):
            Circle(SKETCH9_R)
    extrude(amount=-BOSS_EXTRUDE3_DEPTH)

    # Sketch10 → Cut-Extrude13 (cut, symmetric)
    with BuildSketch(Plane.ZY.offset(40)):
        with Locations((70.605937199, -16.255142793)):
            Rectangle(SKETCH10_W, SKETCH10_H)
    extrude(amount=CUT_EXTRUDE13_DEPTH, both=True, mode=Mode.SUBTRACT)


solid = part.part
